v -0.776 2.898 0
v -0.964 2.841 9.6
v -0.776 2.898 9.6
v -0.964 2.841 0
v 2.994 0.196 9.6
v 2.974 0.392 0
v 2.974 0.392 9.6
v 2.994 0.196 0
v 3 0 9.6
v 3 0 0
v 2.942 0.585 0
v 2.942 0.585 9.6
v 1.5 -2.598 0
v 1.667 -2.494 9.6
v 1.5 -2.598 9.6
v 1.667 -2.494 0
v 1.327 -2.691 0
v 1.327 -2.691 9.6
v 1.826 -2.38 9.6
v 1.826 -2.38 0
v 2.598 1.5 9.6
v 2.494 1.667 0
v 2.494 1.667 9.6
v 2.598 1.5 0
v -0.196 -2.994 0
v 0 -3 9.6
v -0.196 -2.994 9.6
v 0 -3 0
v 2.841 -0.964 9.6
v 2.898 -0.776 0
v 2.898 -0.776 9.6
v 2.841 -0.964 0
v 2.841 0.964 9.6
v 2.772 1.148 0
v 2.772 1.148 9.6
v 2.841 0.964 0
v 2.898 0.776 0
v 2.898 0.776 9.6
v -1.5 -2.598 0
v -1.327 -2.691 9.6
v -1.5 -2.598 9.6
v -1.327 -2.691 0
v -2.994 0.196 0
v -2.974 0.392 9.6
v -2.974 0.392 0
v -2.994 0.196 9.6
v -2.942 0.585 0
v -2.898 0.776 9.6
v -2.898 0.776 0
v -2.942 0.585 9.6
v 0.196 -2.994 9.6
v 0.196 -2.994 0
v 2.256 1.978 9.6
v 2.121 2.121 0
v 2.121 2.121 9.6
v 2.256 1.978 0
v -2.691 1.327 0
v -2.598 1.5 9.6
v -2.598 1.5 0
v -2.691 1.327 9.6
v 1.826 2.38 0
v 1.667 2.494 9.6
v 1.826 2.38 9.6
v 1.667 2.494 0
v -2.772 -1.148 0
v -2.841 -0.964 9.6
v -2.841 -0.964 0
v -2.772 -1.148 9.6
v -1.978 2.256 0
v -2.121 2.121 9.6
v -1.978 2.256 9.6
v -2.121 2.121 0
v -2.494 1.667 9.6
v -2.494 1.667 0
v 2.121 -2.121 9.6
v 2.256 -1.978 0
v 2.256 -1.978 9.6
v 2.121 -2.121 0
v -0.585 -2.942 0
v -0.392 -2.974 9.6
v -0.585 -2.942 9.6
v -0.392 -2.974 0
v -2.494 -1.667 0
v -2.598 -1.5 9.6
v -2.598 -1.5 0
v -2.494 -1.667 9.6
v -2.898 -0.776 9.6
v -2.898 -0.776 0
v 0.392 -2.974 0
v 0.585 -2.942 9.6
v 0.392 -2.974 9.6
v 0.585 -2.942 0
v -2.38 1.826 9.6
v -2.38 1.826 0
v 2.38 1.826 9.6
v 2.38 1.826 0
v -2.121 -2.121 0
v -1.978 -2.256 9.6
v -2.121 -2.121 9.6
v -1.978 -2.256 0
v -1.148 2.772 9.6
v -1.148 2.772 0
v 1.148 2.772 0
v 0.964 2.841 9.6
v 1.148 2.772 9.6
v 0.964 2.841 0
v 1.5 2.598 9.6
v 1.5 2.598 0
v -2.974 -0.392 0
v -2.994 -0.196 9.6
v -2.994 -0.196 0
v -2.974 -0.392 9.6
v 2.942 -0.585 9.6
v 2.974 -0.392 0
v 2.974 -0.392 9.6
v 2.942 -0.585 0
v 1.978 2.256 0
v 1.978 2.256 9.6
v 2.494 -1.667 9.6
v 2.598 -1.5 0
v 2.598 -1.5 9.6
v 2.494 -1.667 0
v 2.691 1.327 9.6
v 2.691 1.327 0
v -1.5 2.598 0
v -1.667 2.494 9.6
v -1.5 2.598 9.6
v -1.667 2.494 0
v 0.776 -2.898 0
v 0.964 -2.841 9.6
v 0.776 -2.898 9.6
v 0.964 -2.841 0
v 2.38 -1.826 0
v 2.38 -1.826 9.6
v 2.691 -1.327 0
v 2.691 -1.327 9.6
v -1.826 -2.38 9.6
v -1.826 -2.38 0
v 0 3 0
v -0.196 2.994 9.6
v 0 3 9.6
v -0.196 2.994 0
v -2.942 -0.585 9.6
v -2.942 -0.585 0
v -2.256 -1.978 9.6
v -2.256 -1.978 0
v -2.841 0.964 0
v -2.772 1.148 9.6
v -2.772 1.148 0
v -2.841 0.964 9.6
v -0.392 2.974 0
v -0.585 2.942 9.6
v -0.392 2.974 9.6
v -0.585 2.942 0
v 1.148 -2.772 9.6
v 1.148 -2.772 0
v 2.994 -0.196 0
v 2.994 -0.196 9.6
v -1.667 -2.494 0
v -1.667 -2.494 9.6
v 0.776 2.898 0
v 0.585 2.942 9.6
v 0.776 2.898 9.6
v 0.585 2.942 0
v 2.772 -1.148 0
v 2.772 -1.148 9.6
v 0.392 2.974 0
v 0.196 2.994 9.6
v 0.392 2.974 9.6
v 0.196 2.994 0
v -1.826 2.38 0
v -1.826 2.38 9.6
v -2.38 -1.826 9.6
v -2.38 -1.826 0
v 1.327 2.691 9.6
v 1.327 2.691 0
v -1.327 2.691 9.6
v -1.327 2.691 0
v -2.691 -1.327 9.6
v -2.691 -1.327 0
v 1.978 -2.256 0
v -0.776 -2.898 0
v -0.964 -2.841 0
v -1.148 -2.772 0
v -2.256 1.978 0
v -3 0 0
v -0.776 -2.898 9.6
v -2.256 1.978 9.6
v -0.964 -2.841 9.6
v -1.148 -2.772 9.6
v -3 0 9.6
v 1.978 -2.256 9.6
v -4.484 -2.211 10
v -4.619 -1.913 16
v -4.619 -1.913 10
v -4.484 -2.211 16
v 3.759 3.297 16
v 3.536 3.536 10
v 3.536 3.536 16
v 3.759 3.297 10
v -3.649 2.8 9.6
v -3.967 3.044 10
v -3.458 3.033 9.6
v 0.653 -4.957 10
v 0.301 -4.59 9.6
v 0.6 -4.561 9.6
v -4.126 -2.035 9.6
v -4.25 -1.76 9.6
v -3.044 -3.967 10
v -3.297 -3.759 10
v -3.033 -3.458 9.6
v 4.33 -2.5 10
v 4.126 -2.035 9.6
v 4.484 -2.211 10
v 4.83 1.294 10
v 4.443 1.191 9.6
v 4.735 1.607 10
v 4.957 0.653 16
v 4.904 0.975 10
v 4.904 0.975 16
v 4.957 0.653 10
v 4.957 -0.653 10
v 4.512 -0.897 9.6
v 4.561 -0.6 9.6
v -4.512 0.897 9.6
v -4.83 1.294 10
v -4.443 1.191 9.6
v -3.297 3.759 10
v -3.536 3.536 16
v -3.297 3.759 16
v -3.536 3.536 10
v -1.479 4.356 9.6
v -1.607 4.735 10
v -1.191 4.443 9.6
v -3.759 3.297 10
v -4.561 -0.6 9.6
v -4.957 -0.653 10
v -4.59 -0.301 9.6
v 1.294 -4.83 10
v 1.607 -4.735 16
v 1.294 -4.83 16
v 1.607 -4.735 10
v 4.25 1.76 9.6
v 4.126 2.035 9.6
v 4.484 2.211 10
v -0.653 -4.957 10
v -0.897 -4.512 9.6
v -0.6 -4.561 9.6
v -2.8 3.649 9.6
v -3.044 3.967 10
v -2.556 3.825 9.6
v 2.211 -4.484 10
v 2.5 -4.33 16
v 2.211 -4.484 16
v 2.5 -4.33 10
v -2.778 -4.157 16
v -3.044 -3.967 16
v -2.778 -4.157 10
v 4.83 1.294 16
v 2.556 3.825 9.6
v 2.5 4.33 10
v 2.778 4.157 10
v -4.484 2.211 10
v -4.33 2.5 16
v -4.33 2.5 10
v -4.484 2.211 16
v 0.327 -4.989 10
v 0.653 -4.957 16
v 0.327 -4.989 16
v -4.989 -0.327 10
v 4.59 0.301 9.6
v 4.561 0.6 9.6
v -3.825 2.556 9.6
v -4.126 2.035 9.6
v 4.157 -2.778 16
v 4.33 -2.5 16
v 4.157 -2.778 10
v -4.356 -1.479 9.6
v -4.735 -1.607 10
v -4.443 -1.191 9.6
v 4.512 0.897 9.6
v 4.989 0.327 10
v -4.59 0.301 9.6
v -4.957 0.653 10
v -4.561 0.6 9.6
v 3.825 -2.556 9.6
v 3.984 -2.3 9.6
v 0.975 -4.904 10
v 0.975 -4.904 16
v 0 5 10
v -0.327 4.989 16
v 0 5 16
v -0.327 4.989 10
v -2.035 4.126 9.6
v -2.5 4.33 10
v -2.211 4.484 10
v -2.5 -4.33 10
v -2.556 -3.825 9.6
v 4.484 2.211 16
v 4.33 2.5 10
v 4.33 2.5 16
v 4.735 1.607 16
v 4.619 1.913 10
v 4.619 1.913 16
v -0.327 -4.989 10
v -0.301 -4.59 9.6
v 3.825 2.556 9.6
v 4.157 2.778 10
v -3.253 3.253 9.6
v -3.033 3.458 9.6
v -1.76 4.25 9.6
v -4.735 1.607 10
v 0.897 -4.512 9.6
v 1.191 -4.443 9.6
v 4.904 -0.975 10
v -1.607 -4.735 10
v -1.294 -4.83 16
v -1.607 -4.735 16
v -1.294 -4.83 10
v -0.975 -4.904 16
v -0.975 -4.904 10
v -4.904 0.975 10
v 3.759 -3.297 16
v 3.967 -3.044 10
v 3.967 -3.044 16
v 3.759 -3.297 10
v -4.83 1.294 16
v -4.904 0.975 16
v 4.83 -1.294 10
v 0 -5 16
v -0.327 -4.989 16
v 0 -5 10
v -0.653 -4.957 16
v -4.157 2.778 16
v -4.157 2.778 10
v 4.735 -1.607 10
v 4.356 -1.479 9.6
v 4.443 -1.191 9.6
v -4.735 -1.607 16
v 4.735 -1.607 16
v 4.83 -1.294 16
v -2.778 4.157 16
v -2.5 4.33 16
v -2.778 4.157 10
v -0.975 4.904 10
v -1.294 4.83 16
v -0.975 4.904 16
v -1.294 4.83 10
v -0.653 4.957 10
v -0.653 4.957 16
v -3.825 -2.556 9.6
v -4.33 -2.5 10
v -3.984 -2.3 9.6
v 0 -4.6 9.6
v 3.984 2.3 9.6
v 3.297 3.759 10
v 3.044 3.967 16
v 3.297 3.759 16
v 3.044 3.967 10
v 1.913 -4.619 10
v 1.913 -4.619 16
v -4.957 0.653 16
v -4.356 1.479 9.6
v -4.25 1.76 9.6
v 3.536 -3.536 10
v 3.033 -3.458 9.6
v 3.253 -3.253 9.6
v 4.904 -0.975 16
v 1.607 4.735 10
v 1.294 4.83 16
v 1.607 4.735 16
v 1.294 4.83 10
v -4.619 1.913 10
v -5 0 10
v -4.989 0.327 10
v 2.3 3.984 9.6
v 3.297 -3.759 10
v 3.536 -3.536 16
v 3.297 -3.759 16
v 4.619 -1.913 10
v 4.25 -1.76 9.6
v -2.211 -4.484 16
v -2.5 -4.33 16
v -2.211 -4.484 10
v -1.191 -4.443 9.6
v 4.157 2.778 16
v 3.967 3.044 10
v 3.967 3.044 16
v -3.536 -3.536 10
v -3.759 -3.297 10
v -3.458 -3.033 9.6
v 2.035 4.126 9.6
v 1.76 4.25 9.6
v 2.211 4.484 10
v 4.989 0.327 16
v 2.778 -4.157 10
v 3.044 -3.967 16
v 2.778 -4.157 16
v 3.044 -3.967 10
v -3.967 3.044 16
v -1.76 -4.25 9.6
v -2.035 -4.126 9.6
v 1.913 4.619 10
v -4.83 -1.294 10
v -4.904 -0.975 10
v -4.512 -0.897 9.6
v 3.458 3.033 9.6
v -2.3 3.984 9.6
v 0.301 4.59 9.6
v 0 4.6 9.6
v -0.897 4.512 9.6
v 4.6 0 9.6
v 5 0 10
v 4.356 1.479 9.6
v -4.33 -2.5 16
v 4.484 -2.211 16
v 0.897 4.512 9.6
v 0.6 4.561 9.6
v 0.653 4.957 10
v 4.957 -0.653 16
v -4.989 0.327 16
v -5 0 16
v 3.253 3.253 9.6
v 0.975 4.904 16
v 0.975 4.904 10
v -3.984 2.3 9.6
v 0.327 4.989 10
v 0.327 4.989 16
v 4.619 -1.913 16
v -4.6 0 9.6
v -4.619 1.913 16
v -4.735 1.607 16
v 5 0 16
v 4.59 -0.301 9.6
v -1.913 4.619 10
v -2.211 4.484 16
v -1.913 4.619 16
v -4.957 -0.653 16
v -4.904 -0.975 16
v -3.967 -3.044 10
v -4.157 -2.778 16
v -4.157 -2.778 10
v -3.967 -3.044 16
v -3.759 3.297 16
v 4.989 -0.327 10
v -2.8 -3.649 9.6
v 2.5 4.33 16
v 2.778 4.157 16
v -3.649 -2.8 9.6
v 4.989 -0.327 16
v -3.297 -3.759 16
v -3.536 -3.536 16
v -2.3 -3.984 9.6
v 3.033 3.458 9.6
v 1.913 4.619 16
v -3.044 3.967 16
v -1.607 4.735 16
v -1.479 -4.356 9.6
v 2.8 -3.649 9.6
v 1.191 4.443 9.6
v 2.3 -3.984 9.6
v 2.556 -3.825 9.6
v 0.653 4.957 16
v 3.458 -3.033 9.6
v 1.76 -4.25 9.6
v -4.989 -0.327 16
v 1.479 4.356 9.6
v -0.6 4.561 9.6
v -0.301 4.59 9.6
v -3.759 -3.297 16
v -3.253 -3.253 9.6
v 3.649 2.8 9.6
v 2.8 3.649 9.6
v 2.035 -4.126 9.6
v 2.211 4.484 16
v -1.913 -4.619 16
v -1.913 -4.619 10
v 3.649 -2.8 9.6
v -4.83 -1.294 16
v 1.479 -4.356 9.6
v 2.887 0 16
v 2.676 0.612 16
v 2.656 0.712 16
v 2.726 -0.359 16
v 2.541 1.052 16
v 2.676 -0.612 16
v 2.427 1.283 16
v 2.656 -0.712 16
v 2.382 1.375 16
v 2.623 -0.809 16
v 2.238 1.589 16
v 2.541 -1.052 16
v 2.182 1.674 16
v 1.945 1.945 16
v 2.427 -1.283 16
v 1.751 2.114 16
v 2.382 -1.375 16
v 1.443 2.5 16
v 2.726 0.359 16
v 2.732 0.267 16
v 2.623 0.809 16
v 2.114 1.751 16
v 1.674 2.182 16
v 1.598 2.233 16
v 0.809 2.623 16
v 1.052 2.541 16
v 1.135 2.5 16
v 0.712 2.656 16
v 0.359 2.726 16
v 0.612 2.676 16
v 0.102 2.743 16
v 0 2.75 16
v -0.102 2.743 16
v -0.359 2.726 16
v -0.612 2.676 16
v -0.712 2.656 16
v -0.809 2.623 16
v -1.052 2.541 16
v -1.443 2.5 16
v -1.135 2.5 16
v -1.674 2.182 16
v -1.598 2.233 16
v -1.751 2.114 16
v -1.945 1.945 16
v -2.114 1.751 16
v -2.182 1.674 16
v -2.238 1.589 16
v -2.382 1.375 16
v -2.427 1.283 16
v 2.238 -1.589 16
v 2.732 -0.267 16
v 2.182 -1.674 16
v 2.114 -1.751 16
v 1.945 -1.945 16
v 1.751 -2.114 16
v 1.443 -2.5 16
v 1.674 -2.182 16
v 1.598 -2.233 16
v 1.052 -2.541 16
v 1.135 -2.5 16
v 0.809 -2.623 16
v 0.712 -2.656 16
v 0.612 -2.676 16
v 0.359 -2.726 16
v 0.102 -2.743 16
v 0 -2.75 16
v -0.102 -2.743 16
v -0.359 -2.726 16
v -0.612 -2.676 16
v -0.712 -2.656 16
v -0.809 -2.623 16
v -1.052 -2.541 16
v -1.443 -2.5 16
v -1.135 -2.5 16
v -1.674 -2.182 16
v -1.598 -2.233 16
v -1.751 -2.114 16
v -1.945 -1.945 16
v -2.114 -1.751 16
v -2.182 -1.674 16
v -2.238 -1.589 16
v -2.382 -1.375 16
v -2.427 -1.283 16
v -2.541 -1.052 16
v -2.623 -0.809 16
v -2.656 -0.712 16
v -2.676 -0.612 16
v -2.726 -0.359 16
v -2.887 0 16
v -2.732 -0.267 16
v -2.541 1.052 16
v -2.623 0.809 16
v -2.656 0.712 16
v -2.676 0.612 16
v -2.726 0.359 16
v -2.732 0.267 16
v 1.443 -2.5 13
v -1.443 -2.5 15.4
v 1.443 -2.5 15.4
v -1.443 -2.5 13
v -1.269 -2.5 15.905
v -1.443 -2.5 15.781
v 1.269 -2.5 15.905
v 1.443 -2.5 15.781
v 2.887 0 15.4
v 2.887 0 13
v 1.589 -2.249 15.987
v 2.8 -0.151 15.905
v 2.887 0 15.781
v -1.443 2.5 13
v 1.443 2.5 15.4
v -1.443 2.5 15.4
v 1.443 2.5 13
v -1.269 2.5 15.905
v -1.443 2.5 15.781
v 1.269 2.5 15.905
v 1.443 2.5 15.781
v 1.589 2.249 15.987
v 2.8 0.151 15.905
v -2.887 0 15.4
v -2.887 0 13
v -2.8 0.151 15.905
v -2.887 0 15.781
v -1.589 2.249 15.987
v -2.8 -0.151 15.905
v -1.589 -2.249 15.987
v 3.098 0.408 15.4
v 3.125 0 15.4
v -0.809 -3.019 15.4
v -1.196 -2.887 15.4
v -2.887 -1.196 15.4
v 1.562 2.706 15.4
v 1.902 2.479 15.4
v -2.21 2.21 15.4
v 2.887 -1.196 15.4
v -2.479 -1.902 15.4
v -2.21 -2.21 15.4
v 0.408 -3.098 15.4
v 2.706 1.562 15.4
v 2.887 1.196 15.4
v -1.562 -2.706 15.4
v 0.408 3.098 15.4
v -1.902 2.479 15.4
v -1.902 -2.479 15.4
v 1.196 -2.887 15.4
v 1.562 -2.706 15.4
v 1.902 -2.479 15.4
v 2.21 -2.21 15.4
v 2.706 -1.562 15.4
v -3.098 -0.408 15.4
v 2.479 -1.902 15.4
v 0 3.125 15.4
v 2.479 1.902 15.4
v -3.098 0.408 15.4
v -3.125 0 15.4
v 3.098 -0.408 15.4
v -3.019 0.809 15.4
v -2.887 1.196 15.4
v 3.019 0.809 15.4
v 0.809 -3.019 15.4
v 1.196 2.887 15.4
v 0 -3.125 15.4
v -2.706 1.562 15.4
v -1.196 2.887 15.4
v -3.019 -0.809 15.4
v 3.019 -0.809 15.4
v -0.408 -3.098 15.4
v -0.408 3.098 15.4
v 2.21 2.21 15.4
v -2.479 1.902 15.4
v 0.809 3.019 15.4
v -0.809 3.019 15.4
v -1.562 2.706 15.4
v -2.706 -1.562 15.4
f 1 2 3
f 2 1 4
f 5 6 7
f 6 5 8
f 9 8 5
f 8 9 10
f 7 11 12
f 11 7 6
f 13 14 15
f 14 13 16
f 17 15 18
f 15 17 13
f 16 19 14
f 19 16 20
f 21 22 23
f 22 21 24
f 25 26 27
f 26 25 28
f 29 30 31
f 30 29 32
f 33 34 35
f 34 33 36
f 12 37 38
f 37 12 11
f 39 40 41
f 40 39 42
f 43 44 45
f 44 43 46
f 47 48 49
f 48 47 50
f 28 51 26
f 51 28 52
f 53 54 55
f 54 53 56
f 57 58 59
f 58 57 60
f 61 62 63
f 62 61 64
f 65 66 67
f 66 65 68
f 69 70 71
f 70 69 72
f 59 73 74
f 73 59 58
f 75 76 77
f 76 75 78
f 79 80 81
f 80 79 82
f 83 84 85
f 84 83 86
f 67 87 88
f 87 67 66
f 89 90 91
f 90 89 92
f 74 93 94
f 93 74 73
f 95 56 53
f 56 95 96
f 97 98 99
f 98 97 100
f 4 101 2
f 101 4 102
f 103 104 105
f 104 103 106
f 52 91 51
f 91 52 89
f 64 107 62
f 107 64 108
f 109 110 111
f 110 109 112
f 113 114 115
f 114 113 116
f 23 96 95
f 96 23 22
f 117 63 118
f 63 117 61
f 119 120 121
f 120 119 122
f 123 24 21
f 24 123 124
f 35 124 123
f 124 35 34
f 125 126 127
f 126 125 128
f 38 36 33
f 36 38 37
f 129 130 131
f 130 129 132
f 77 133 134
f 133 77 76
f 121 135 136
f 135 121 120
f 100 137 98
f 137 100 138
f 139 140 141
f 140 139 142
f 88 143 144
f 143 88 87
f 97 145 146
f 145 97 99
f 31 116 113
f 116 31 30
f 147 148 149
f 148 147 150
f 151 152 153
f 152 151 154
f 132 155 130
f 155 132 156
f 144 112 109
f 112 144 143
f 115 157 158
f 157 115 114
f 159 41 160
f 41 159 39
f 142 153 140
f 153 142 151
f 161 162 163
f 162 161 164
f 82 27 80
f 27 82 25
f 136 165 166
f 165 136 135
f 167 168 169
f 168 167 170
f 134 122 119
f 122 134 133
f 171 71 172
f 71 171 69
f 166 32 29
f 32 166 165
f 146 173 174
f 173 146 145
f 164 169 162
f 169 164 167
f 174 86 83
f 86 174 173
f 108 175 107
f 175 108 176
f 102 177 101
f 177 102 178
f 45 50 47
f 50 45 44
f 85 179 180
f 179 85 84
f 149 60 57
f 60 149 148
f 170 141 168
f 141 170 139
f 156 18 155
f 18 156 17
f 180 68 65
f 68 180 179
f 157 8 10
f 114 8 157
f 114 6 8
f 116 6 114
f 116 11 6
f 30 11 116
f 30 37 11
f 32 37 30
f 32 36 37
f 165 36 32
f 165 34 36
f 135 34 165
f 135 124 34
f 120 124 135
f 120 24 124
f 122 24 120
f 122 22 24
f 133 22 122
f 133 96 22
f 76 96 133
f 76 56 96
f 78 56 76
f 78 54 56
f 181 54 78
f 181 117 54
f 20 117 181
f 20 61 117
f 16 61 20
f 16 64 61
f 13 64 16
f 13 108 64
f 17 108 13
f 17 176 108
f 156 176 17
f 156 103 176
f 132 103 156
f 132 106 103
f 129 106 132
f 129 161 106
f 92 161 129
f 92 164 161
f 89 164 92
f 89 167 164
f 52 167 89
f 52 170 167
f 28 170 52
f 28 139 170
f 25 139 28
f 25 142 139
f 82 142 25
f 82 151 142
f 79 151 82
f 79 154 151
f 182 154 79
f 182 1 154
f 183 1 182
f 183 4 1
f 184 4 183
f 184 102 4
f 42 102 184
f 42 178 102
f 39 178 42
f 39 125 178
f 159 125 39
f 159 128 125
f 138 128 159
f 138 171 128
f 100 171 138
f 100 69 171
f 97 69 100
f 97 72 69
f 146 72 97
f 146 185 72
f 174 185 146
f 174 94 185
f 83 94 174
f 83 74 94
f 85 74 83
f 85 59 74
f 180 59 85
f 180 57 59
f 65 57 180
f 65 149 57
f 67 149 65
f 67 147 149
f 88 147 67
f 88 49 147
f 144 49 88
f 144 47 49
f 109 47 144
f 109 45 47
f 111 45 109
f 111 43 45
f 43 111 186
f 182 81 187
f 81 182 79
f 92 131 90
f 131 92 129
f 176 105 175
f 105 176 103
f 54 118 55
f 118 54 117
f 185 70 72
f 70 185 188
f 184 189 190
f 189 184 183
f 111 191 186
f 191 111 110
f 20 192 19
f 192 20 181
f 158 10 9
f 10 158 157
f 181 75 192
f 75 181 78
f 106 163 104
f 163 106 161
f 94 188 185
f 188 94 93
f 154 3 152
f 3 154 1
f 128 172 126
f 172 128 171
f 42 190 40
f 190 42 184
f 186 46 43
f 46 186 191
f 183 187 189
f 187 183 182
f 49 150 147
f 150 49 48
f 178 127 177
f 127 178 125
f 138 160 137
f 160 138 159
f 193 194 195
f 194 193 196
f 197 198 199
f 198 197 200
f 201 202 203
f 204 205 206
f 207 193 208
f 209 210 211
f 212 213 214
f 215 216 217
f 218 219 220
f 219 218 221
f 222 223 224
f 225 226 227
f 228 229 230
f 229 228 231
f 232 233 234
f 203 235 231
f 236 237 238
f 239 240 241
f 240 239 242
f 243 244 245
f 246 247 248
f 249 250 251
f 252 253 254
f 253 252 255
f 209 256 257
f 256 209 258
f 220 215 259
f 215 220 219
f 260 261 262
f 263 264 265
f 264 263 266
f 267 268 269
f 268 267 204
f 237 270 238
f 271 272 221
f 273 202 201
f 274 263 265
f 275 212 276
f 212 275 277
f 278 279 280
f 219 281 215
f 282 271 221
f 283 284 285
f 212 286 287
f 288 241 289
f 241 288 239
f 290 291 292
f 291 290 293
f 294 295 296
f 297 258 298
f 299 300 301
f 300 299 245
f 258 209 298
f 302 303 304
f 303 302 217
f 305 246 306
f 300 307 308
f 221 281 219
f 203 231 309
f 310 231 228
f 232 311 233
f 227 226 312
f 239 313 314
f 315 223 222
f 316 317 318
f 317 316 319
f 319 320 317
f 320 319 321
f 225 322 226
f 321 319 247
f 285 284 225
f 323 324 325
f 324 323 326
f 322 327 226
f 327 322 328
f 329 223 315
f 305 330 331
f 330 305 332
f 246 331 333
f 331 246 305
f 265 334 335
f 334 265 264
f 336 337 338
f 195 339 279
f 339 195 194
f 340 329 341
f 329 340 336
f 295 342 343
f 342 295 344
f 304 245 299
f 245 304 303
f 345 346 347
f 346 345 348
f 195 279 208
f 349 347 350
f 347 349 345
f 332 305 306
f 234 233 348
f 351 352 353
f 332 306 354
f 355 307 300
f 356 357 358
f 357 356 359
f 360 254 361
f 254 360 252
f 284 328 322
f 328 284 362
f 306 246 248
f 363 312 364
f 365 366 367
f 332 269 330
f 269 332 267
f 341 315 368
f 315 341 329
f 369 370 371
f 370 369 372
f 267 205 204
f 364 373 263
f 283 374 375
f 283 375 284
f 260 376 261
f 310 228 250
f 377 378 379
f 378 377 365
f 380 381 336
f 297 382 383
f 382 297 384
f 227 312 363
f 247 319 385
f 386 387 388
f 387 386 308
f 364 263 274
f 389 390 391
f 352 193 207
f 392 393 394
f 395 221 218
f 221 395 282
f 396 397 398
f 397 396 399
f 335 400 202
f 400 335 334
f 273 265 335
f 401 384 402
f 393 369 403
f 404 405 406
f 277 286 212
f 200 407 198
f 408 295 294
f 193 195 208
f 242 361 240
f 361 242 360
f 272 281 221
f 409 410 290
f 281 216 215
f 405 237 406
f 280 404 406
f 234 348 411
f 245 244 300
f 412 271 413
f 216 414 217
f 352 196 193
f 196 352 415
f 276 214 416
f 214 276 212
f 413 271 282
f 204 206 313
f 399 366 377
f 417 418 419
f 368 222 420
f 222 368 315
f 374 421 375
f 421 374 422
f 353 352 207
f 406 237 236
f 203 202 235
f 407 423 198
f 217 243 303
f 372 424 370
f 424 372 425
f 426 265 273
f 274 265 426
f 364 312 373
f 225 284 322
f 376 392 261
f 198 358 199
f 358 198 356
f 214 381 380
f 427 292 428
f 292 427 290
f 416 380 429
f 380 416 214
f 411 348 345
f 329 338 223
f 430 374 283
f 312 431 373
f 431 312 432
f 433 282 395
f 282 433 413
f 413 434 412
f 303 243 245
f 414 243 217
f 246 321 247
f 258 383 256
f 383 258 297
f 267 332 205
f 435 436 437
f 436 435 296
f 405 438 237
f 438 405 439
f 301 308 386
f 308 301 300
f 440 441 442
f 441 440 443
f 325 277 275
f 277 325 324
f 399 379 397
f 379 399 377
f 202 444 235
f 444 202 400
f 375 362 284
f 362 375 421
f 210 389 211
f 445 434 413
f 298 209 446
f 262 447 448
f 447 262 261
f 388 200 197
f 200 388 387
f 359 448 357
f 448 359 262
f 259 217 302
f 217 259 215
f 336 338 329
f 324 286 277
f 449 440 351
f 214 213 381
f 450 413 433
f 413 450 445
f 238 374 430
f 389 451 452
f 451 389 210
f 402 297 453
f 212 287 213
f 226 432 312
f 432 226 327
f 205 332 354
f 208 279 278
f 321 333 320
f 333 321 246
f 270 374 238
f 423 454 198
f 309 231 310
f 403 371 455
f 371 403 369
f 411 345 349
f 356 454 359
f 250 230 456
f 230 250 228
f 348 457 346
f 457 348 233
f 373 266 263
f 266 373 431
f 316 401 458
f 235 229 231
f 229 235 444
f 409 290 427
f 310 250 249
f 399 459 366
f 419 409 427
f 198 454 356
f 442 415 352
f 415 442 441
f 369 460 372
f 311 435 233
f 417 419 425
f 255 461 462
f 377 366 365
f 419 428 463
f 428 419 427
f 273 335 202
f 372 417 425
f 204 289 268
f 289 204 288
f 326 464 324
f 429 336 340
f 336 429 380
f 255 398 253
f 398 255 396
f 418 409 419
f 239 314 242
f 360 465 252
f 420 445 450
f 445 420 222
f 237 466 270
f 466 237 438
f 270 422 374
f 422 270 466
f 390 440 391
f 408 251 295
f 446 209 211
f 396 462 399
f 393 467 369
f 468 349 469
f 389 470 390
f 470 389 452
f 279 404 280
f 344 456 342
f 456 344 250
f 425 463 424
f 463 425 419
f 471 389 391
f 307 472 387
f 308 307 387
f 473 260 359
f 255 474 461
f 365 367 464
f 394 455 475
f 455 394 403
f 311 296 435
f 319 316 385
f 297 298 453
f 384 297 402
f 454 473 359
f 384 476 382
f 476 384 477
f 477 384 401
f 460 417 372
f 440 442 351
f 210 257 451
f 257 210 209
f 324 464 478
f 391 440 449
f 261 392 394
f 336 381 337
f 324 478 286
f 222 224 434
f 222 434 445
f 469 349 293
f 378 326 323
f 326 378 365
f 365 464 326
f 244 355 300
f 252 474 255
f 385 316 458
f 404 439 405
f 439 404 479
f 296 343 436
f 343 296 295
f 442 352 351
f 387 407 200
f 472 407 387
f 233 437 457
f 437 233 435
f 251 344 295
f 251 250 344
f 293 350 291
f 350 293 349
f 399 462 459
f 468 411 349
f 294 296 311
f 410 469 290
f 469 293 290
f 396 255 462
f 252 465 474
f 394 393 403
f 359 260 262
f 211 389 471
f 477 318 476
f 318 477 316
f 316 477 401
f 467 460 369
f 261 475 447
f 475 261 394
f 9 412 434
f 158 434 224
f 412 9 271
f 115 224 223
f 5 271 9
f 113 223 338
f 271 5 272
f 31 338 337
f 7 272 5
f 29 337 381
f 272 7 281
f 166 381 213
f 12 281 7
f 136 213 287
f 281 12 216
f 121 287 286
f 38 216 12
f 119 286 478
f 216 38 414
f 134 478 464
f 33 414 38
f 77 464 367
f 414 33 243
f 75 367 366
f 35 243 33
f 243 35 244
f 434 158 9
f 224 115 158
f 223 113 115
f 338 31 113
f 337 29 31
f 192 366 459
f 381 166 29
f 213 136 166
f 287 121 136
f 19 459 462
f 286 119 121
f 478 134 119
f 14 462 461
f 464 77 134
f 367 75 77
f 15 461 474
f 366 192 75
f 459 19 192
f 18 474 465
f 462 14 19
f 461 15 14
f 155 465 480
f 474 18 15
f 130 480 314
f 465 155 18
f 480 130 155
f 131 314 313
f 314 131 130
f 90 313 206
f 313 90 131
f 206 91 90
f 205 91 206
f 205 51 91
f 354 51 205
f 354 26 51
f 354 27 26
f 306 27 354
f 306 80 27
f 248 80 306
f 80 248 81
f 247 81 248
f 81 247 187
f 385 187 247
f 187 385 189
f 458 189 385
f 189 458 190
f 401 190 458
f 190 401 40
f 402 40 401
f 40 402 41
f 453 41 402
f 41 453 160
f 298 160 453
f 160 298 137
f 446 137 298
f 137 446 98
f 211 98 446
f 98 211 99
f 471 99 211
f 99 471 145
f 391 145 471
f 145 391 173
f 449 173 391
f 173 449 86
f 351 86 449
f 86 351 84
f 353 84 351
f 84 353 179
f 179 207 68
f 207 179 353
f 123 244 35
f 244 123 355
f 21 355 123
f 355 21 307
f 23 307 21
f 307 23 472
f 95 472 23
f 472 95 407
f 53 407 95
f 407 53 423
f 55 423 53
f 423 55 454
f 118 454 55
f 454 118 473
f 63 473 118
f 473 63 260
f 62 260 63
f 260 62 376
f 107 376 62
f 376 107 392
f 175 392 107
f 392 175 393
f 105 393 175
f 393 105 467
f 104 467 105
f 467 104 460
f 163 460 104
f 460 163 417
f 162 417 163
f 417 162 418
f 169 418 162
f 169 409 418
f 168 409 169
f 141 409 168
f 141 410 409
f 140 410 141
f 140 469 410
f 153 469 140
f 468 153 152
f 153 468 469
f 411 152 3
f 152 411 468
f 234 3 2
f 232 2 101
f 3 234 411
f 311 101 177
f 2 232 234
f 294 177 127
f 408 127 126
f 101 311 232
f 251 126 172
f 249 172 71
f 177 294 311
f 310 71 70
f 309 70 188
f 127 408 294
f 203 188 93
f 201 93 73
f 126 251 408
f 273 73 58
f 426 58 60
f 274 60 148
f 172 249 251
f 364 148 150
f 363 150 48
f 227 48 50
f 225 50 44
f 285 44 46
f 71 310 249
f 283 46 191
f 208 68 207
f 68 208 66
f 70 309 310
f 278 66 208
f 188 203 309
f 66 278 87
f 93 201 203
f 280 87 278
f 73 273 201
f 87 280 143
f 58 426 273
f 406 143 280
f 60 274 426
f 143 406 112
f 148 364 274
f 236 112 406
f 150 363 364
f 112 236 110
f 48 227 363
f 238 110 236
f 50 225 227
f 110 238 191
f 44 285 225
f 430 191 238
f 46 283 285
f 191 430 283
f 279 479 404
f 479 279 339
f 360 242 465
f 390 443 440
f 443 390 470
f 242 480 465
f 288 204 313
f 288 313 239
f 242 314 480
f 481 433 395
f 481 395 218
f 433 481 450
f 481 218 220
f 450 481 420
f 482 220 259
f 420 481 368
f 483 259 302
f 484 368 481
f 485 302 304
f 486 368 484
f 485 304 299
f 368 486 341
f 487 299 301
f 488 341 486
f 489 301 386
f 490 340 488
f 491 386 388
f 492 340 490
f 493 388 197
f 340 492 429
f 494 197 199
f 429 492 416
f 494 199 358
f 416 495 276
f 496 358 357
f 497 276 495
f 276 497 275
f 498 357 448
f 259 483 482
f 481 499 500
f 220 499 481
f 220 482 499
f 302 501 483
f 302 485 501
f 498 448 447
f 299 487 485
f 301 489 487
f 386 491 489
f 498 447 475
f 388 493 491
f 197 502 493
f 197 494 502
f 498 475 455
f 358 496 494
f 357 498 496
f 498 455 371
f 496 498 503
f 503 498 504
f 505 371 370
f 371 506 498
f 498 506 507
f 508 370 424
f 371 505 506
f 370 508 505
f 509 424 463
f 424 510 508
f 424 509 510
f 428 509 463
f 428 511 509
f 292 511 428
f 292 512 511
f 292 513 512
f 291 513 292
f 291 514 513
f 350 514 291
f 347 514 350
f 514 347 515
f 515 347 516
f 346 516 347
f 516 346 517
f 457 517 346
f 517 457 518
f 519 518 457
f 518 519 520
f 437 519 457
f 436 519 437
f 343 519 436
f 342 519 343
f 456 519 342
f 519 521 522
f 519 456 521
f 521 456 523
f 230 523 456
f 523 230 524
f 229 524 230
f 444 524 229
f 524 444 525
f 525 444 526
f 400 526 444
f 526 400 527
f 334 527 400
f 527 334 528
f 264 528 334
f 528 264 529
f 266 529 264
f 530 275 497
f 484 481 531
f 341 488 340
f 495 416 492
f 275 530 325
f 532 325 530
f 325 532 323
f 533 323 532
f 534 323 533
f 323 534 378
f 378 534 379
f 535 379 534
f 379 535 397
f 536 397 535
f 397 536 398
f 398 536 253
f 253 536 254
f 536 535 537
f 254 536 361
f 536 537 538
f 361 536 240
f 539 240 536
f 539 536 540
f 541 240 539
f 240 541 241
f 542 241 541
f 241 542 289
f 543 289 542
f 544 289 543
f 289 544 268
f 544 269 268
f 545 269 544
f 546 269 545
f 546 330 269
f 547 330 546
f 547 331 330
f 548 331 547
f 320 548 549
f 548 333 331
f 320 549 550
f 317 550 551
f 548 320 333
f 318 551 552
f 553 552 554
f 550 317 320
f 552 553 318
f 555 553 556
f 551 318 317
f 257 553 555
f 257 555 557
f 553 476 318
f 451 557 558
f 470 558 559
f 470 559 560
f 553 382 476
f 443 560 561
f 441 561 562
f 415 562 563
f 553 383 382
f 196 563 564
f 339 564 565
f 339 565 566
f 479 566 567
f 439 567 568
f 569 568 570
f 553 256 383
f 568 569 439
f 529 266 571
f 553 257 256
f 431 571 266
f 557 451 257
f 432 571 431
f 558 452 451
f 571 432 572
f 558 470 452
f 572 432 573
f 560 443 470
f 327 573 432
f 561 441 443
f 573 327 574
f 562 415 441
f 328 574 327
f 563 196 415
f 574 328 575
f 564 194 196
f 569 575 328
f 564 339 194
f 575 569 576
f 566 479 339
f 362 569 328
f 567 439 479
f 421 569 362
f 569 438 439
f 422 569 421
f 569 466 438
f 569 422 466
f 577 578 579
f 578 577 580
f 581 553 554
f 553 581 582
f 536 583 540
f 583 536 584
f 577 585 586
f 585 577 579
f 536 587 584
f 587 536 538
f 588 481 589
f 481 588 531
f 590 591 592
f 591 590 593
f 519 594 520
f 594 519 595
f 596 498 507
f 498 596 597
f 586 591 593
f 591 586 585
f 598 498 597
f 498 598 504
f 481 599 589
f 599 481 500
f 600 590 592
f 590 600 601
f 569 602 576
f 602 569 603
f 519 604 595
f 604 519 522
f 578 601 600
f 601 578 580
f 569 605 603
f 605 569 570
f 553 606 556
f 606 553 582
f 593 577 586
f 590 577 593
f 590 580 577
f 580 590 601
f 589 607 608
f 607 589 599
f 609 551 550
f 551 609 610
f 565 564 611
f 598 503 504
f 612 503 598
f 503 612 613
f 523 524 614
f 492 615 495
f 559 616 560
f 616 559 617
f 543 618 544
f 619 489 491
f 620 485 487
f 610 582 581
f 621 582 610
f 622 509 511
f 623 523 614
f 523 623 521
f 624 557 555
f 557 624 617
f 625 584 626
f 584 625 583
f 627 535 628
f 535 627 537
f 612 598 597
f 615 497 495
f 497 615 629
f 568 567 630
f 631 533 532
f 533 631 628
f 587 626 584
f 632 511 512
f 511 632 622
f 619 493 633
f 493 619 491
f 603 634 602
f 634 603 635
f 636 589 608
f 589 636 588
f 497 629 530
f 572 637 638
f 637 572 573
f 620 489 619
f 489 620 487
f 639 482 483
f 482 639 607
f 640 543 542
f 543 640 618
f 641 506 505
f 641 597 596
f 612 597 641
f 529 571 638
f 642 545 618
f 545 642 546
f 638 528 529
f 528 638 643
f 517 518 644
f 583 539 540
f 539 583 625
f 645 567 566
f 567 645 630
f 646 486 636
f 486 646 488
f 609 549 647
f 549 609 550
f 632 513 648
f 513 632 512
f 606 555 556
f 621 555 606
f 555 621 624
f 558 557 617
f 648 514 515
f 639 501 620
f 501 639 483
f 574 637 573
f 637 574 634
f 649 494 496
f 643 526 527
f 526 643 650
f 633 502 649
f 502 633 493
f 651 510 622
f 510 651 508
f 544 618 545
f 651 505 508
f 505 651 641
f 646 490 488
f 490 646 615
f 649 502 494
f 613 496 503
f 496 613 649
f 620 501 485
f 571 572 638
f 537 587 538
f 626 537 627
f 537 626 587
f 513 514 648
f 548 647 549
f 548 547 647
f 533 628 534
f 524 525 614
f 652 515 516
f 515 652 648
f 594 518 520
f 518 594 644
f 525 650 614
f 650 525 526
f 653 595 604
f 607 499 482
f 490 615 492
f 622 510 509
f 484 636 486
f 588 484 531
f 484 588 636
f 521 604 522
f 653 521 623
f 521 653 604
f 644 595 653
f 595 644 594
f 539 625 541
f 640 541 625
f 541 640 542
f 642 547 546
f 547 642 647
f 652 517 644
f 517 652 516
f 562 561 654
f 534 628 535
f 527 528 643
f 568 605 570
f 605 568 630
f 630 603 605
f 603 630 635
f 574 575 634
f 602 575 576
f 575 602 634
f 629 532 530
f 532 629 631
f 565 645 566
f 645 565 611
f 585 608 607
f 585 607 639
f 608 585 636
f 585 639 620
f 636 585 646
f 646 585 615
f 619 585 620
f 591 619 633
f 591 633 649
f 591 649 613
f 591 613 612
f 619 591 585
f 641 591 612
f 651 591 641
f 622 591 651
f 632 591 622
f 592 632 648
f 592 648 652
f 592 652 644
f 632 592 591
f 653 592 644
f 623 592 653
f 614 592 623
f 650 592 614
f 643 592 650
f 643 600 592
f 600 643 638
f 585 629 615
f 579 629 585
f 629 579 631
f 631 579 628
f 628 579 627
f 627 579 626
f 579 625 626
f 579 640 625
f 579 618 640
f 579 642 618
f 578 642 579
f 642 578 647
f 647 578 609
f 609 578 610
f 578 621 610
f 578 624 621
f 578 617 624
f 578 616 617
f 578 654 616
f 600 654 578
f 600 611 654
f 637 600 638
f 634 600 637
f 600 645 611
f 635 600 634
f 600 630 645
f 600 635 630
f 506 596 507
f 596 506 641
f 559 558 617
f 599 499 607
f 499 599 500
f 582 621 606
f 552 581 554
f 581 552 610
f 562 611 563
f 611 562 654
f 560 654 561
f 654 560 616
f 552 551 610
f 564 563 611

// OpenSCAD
$fn = 96;

module socket_head_cap_screw(d=6.0, head_d=10.0, head_h=6.0, L=10.0) {
    // Approximate ISO 4762 proportions for M6:
    // Hex socket across flats ~ 5mm, depth ~ 3mm
    socket_af = 5.0;
    socket_depth = 3.0;
    socket_corner_r = 0.2;

    // Small under-head fillet approximation
    underhead_r = 0.4;

    // Helper: hex prism sized by across-flats
    module hex_prism(af, h) {
        // For a regular hexagon, across-flats = 2 * apothem = sqrt(3) * R
        // where R is circumradius (center to vertex)
        R = af / sqrt(3);
        cylinder(h=h, r=R, $fn=6);
    }

    difference() {
        union() {
            // Shank
            cylinder(h=L, d=d);

            // Head (with slight under-head fillet via hull)
            translate([0,0,L])
            hull() {
                cylinder(h=0.01, d=head_d);
                translate([0,0,-underhead_r])
                    cylinder(h=0.01, d=head_d - 2*underhead_r);
            }
            translate([0,0,L])
                cylinder(h=head_h, d=head_d);
        }

        // Socket recess
        translate([0,0,L + head_h - socket_depth])
            hex_prism(socket_af, socket_depth + 0.2);

        // Slight chamfer at socket opening (approx)
        translate([0,0,L + head_h - 0.6])
            cylinder(h=0.6 + 0.2, d1=socket_af*1.25, d2=socket_af*1.05, $fn=48);
    }
}

socket_head_cap_screw(d=6.0, head_d=10.0, head_h=6.0, L=10.0);
